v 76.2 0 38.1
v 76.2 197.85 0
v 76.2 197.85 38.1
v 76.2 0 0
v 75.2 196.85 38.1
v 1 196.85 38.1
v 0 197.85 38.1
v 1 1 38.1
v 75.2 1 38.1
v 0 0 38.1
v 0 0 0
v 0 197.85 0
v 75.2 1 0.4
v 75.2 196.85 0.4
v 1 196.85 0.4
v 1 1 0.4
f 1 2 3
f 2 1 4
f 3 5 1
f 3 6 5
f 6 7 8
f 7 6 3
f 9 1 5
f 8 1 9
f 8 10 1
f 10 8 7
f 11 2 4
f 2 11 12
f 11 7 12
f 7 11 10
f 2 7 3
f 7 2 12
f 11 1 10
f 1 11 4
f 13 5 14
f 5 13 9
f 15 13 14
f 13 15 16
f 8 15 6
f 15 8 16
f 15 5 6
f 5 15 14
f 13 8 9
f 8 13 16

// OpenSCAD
// file: ../bin.scad
module bin(width, depth, height, wall_thickness, floor_thickness) {
    difference() {
        cube([width, depth, height]);
        translate([
            wall_thickness, wall_thickness, floor_thickness
        ]) cube([
            width - 2 * wall_thickness,
            depth - 2 * wall_thickness,
            height - floor_thickness
        ]);
    }
}
// main file
use <../bin.scad>

// 1 inch = 25.4 mm

total_drawer_depth = 18.75 * 25.4;
teeth_unit_depth = 9 * 25.4 + 2 * 25.4 - 1;
width = 3 * 25.4;

bin(
    width,
    total_drawer_depth - teeth_unit_depth,
    1.5 * 25.4,
    1,
    0.4
);
